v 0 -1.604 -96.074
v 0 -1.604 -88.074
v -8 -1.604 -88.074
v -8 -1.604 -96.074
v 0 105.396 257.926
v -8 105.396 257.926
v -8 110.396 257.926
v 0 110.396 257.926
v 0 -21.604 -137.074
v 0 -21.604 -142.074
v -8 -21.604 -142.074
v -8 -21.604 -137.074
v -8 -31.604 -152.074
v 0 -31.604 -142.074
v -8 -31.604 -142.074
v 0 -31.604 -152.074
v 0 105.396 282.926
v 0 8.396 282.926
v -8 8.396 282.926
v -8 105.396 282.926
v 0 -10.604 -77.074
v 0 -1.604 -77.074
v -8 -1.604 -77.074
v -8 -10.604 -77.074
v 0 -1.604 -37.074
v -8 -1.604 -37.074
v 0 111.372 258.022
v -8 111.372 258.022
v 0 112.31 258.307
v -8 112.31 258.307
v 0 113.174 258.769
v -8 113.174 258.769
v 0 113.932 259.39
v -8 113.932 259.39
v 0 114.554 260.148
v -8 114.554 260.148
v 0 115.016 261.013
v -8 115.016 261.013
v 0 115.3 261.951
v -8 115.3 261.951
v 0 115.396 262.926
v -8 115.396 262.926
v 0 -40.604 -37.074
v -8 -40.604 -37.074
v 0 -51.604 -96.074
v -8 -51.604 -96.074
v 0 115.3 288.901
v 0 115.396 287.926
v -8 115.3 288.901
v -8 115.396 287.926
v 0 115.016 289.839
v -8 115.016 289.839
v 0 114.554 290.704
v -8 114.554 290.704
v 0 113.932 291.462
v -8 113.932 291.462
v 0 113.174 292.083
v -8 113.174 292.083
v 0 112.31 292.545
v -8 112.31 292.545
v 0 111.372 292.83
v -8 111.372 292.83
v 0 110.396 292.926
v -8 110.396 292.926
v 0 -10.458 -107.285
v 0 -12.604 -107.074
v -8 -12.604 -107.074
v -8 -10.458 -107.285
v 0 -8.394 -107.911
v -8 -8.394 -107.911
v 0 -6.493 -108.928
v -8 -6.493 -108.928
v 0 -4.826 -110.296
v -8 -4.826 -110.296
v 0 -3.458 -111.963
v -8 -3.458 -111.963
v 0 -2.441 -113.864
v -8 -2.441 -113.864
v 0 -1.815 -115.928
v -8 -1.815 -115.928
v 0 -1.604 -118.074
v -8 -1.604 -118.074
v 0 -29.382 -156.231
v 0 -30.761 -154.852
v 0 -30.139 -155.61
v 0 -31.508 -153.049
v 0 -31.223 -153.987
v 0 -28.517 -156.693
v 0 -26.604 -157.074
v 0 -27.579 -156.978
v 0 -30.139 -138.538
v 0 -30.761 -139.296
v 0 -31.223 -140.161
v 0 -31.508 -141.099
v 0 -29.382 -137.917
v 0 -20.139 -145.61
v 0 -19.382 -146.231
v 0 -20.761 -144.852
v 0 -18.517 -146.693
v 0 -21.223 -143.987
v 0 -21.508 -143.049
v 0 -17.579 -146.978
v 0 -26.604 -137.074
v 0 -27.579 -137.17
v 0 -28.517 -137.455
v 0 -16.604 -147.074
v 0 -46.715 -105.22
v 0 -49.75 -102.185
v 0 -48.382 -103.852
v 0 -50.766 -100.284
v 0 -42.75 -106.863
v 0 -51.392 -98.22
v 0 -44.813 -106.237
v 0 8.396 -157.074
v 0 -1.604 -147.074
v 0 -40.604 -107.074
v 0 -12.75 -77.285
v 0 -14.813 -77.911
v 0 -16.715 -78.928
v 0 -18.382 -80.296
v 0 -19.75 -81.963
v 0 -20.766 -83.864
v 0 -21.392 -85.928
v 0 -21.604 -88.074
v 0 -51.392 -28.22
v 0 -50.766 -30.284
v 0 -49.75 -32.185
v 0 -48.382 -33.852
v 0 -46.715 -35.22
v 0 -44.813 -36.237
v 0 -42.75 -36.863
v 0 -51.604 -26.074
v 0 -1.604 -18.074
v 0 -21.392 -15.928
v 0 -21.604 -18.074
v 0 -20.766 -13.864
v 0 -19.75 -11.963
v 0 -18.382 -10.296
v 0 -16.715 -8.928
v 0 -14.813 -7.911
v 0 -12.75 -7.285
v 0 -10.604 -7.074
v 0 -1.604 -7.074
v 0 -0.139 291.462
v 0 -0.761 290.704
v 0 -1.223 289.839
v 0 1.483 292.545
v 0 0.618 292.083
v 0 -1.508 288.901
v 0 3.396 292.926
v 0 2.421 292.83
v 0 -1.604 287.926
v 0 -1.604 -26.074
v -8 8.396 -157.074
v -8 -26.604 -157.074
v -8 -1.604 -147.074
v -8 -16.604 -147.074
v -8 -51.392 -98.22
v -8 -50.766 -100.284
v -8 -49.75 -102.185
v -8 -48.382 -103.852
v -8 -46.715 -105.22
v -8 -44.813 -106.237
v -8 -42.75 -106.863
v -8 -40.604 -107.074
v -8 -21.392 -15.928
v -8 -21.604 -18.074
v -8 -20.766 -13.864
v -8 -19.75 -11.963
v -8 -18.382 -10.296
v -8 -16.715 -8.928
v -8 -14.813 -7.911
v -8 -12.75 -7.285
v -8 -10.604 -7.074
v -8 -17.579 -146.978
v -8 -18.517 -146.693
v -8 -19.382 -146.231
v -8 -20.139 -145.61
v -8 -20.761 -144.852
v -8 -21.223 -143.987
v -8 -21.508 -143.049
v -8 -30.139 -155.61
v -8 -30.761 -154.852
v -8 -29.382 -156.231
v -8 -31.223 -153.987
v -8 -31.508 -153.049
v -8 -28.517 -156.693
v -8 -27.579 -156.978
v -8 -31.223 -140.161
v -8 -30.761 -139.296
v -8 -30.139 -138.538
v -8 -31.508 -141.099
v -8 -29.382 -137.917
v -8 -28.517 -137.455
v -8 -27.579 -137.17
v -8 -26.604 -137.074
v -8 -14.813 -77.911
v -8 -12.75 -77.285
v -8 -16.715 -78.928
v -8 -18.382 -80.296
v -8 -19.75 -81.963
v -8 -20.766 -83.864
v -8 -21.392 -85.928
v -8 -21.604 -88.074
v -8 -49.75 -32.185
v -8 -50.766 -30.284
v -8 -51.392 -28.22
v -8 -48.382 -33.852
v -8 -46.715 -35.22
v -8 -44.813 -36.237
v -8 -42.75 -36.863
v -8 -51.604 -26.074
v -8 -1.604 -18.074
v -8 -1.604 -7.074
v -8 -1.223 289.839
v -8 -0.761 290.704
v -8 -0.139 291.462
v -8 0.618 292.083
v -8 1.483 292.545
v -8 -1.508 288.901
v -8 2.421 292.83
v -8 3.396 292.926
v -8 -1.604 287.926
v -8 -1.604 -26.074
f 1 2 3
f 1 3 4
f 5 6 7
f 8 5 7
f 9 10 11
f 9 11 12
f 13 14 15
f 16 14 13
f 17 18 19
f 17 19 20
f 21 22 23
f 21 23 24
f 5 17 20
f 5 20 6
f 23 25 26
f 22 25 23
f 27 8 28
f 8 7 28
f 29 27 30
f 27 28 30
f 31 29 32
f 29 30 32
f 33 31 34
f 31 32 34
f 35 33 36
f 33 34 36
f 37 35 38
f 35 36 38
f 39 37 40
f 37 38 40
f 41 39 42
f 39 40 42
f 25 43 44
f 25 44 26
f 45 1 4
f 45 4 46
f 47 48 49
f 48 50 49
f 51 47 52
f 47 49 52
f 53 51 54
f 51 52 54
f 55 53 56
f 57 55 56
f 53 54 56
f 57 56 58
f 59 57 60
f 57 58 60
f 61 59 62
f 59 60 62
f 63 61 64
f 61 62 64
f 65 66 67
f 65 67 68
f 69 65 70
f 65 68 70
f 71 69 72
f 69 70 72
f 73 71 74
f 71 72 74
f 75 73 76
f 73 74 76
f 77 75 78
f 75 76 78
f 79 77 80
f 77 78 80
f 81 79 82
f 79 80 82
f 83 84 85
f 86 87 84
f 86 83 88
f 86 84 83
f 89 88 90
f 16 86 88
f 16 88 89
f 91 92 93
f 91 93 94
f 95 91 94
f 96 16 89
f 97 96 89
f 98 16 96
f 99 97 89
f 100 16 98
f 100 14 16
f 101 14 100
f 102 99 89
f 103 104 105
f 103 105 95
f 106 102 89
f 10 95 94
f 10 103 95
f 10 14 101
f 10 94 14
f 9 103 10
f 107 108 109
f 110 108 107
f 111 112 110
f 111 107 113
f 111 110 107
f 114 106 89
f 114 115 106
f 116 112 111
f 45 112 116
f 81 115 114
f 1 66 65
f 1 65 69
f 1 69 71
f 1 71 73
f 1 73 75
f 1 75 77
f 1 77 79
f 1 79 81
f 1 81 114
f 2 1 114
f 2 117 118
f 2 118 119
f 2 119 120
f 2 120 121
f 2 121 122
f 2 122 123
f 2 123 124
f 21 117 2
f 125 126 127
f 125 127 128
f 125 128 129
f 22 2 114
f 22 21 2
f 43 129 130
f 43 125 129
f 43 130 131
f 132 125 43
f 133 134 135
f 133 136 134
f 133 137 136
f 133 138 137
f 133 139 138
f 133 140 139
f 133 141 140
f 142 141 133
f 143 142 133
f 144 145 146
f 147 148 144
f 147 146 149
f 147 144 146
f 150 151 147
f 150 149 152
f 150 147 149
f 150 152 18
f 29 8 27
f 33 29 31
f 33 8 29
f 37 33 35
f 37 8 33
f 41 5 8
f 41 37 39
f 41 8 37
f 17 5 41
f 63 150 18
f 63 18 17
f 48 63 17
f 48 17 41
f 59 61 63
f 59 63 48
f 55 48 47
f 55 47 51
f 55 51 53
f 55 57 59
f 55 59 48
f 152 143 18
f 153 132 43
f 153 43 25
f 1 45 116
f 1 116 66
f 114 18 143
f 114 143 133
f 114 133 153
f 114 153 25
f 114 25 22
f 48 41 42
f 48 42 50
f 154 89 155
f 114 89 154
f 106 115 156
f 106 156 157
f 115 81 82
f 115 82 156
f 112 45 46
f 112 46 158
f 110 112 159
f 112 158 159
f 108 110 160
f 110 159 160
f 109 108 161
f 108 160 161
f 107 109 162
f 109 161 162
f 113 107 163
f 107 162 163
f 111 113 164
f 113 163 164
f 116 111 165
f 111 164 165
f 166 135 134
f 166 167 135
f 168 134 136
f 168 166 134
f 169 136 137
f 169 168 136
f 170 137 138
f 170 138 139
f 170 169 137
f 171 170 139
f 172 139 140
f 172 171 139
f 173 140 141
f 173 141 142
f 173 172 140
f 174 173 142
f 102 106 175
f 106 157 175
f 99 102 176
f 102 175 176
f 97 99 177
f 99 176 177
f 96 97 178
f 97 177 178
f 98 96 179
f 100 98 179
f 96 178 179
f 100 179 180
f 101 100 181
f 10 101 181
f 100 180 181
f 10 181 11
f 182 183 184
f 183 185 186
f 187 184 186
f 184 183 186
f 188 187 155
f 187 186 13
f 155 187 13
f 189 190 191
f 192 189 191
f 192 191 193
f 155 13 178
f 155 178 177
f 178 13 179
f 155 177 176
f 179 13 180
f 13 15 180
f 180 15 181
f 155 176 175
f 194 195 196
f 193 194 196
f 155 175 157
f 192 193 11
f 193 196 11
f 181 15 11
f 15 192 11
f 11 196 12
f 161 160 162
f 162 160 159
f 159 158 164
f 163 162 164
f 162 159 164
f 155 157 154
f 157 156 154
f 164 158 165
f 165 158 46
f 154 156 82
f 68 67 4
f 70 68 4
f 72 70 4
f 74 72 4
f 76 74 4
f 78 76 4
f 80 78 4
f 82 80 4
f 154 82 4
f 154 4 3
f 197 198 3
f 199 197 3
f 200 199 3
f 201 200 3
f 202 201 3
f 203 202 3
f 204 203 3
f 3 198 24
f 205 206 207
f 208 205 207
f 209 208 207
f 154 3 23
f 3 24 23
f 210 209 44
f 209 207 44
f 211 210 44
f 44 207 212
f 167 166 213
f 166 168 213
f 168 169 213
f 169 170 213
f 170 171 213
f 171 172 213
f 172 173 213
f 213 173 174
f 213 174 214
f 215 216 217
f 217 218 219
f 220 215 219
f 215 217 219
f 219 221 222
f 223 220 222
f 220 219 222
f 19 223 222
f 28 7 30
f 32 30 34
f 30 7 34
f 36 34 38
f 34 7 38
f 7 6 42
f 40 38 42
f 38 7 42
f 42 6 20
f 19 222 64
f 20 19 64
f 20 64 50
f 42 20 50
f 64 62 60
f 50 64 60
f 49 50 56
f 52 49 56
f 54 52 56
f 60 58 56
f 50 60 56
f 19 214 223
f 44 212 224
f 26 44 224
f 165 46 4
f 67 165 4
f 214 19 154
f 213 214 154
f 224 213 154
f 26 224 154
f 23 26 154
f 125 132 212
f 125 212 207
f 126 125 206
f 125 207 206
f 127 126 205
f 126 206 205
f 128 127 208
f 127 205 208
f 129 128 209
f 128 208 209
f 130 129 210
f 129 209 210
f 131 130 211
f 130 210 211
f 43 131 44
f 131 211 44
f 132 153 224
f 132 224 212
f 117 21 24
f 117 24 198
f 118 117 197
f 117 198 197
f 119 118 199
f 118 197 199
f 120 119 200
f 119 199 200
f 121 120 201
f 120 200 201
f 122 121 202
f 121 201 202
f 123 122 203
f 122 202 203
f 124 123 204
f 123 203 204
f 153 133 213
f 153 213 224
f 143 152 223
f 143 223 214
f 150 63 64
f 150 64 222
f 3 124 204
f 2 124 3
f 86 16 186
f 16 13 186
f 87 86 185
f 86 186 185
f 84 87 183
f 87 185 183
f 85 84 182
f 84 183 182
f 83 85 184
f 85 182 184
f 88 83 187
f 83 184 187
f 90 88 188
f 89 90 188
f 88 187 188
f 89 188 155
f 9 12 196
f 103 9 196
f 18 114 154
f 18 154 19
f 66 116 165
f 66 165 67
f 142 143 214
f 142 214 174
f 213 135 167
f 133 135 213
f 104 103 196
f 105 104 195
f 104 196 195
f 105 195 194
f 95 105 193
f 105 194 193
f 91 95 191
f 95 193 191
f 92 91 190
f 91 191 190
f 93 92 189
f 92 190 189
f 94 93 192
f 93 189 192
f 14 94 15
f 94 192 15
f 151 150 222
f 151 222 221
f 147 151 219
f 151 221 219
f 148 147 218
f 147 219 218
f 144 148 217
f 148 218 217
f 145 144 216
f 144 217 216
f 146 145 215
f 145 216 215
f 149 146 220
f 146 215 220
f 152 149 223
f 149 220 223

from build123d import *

# Parameters (mm, degrees)
F1_DEPTH = 8
F2_R     = 10.99999
F3_R     = 10.99999
F4_R     = 10.99999
F5_R     = 10.99999
F6_R     = 5
F7_R     = 5


# Not quite as in the source:
# - a fillet or chamfer is up to 0.001 mm smaller than in the source, because OpenCascade refuses the exact size


with BuildPart() as f1:
    # F0 (on Right) → F1 (new body)
    with BuildSketch(Plane.YZ):
        Polygon((115.3961805266, 292.9259983301), (-1.6038194734, 292.9259983301), (-1.6038194734, -7.0740016699), (-21.6038194734, -7.0740016699), (-21.6038194734, -18.0740016699), (-1.6038194734, -18.0740016699), (-1.6038194734, -26.0740016699), (-51.6038194734, -26.0740016699), (-51.6038194734, -37.0740016699), (-1.6038194734, -37.0740016699), (-1.6038194734, -77.0740016699), (-21.6038194734, -77.0740016699), (-21.6038194734, -88.0740016699), (-1.6038194734, -88.0740016699), (-1.6038194734, -96.0740016699), (-51.6038194734, -96.0740016699), (-51.6038194734, -107.0740016699), (-1.6038194734, -107.0740016699), (-1.6038194734, -147.0740016699), (-21.6038194734, -147.0740016699), (-21.6038194734, -137.0740016699), (-31.6038194734, -137.0740016699), (-31.6038194734, -157.0740016699), (8.3961805266, -157.0740016699), (8.3961805266, 282.9259983301), (105.3961805266, 282.9259983301), (105.3961805266, 257.9259983301), (115.3961805266, 257.9259983301), align=None)
    extrude(amount=-F1_DEPTH)

    # F2 (radius 11 in the source; OpenCascade refuses exactly that, so slightly less here)
    f2_edges = [f1.edges().sort_by_distance(p)[0] for p in [
        (-4, -51.603819, -37.074002),
    ]]
    fillet(f2_edges, radius=F2_R)

    # F3 (radius 11 in the source; OpenCascade refuses exactly that, so slightly less here)
    f3_edges = [f1.edges().sort_by_distance(p)[0] for p in [
        (-4, -21.603819, -7.074002),
    ]]
    fillet(f3_edges, radius=F3_R)

    # F4 (radius 11 in the source; OpenCascade refuses exactly that, so slightly less here)
    f4_edges = [f1.edges().sort_by_distance(p)[0] for p in [
        (-4, -21.603819, -77.074002),
    ]]
    fillet(f4_edges, radius=F4_R)

    # F5 (radius 11 in the source; OpenCascade refuses exactly that, so slightly less here)
    f5_edges = [f1.edges().sort_by_distance(p)[0] for p in [
        (-4, -51.603819, -107.074002),
        (-4, -1.603819, -107.074002),
    ]]
    fillet(f5_edges, radius=F5_R)

    # F6
    f6_edges = [f1.edges().sort_by_distance(p)[0] for p in [
        (-4, -31.603819, -137.074002),
        (-4, -31.603819, -157.074002),
        (-4, -21.603819, -147.074002),
    ]]
    fillet(f6_edges, radius=F6_R)

    # F7
    f7_edges = [f1.edges().sort_by_distance(p)[0] for p in [
        (-4, -1.603819, 292.925998),
        (-4, 115.396181, 292.925998),
        (-4, 115.396181, 257.925998),
    ]]
    fillet(f7_edges, radius=F7_R)


solid = f1.part
